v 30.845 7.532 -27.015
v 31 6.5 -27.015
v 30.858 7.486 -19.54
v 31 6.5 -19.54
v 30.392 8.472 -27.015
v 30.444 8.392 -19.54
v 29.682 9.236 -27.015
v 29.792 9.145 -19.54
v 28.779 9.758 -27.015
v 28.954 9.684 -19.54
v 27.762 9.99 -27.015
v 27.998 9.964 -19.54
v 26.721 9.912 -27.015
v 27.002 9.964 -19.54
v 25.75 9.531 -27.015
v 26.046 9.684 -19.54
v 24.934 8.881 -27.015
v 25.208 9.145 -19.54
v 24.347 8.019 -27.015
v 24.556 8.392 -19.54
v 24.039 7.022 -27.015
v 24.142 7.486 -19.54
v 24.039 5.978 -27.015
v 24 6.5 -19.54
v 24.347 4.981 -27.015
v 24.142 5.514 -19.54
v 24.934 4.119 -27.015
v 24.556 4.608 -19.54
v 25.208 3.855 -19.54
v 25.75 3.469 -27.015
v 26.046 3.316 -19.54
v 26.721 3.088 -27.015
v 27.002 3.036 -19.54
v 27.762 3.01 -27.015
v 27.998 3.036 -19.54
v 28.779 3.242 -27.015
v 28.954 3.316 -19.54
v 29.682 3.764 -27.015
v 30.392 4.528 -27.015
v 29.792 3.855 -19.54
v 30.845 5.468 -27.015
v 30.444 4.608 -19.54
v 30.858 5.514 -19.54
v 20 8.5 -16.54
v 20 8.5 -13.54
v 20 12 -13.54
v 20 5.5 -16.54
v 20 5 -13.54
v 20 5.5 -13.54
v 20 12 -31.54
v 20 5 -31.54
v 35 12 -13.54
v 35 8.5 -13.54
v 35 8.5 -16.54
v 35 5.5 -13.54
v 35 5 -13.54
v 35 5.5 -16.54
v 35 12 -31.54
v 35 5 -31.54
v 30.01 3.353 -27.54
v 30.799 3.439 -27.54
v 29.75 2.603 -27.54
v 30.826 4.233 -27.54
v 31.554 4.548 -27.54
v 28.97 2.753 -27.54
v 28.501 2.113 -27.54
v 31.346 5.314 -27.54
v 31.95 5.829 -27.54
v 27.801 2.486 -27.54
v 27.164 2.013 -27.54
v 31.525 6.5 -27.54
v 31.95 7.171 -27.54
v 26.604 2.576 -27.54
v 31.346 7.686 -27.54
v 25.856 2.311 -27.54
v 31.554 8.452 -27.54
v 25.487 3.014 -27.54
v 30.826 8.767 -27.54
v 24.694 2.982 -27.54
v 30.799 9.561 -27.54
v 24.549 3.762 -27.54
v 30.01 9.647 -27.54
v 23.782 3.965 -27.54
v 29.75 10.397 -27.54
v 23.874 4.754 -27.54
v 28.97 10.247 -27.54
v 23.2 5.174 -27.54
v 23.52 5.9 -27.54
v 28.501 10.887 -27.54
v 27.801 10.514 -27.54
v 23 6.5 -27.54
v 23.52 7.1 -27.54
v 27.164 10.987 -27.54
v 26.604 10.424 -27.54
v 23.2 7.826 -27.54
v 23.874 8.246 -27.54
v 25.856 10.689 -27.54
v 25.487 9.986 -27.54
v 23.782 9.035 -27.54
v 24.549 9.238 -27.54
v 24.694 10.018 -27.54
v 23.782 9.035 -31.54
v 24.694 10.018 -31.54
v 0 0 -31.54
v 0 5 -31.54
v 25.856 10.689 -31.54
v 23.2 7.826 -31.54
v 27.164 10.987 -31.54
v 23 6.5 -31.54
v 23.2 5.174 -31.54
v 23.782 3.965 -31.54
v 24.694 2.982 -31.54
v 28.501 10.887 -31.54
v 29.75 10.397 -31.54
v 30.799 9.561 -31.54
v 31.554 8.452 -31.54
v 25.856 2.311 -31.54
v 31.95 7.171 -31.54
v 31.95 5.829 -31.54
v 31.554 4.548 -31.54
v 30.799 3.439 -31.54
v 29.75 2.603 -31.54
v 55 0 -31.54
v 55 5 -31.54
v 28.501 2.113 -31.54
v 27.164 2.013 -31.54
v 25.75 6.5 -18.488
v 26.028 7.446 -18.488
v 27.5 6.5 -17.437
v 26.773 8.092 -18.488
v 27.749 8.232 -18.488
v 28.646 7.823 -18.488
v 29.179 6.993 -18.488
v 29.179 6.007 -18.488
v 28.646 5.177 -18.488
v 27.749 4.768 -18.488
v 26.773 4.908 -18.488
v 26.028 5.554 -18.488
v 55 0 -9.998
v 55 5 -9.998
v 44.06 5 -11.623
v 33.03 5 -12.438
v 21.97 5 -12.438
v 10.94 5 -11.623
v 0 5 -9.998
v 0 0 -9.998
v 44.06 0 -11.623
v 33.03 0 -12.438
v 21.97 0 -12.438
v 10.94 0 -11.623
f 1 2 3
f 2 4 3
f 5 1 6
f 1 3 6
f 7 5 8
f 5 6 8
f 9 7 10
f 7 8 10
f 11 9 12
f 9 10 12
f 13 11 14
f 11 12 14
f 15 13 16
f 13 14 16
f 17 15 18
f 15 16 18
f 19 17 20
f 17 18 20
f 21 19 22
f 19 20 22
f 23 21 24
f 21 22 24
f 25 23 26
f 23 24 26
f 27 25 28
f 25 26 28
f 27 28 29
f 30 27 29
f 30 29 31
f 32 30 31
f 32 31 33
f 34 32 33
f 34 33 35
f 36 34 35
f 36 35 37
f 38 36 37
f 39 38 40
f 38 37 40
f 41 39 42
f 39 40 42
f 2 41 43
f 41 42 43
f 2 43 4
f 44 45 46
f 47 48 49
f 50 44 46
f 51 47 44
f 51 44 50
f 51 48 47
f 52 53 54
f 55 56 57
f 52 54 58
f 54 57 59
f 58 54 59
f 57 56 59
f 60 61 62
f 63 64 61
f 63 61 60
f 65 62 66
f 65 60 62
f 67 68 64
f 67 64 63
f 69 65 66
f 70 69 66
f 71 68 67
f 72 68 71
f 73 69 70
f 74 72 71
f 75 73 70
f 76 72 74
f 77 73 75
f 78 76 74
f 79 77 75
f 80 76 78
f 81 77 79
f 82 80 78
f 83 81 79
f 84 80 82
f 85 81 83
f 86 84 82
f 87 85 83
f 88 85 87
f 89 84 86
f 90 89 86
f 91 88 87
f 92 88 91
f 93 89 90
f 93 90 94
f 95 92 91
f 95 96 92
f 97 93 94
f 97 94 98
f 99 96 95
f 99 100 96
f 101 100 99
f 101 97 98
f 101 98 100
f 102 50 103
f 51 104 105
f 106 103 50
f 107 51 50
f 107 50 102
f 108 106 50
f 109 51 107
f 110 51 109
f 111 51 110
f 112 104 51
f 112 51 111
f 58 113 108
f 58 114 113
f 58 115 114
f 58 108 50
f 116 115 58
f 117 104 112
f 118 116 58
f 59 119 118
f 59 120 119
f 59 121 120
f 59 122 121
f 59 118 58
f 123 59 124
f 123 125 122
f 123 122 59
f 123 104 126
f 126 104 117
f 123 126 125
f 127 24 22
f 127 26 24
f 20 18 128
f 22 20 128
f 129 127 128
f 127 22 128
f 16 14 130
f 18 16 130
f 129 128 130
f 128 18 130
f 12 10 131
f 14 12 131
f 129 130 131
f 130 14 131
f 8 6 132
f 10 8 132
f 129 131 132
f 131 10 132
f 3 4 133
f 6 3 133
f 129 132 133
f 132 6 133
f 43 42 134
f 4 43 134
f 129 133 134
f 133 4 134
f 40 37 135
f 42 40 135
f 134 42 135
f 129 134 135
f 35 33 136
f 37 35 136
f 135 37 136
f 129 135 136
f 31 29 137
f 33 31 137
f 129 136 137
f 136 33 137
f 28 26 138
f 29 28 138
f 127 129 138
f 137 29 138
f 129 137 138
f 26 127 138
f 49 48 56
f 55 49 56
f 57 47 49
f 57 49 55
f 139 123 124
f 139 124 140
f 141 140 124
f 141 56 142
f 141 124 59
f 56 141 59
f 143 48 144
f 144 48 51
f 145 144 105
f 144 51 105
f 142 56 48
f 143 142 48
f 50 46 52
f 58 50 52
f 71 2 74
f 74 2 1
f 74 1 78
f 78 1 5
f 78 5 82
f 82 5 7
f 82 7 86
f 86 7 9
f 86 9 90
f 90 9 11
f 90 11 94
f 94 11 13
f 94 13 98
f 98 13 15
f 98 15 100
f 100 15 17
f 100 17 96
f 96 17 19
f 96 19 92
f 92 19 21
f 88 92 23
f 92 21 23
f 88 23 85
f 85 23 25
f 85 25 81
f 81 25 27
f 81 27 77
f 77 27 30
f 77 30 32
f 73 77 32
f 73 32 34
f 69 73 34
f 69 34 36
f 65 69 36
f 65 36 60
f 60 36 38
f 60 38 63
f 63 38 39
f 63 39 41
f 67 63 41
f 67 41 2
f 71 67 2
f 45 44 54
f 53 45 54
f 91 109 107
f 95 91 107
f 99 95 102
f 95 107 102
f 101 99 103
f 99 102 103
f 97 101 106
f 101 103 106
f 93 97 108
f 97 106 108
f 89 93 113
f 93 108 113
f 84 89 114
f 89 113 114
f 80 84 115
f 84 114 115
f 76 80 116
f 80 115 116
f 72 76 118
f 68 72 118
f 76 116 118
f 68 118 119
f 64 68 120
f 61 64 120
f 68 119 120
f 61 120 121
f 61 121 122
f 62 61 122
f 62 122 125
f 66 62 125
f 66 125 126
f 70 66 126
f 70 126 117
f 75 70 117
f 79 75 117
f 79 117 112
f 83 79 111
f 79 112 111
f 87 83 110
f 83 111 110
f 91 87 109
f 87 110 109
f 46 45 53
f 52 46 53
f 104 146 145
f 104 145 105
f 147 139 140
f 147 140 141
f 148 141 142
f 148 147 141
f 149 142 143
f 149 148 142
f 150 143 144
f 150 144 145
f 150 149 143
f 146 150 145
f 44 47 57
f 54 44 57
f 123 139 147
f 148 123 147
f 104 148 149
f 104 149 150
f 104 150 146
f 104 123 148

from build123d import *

# Parameters (mm, degrees)
BOSS_EXTRUDE1_DEPTH             = 5
SKETCH4_W                       = 15
SKETCH4_H                       = 18
BOSS_EXTRUDE2_DEPTH             = 0.5
SKETCH5_W                       = 15
SKETCH5_H                       = 15
BOSS_EXTRUDE3_DEPTH             = 3
SKETCH6_W                       = 15
SKETCH6_H                       = 18
BOSS_EXTRUDE4_DEPTH             = 3.5
SKETCH9_R                       = 4.5
CUT_EXTRUDE1_DEPTH              = 4
M8X1_0_TAPPED_HOLE1_D           = 7
M8X1_0_TAPPED_HOLE1_DEPTH       = 8
M8X1_0_TAPPED_HOLE1_CSINK_D     = 8.05
M8X1_0_TAPPED_HOLE1_CSINK_ANGLE = 90
M8X1_0_TAPPED_HOLE1_TIP         = 2.103012167


with BuildPart() as part:
    # Sketch1 → Boss-Extrude1 (new body)
    with BuildSketch(Plane(origin=(0, 0, 0), x_dir=(1, 0, 0), z_dir=(0, 1, 0))):
        with BuildLine():
            Line((0, 9.997621031), (0, 31.54))
            Line((0, 31.54), (55, 31.54))
            Line((55, 31.54), (55, 9.997621031))
            ThreePointArc((55, 9.997621031), (27.5, 12.54), (0, 9.997621031))
        make_face()
    extrude(amount=BOSS_EXTRUDE1_DEPTH)

    # Sketch4 → Boss-Extrude2 (add)
    with BuildSketch(Plane(origin=(0, 5, 0), x_dir=(1, 0, 0), z_dir=(0, 1, 0))):
        with Locations((27.5, 22.54)):
            Rectangle(SKETCH4_W, SKETCH4_H)
    extrude(amount=BOSS_EXTRUDE2_DEPTH)

    # Sketch5 → Boss-Extrude3 (add)
    with BuildSketch(Plane(origin=(0, 5.5, 0), x_dir=(1, 0, 0), z_dir=(0, 1, 0))):
        with Locations((27.5, 24.04)):
            Rectangle(SKETCH5_W, SKETCH5_H)
    extrude(amount=BOSS_EXTRUDE3_DEPTH)

    # Sketch6 → Boss-Extrude4 (add)
    with BuildSketch(Plane(origin=(0, 8.5, 0), x_dir=(1, 0, 0), z_dir=(0, 1, 0))):
        with Locations((27.5, 22.54)):
            Rectangle(SKETCH6_W, SKETCH6_H)
    extrude(amount=BOSS_EXTRUDE4_DEPTH)

    # Sketch9 → Cut-Extrude1 (cut)
    with BuildSketch(Plane(origin=(0, 0, -31.54), x_dir=(-1, 0, 0), z_dir=(0, 0, -1))):
        with Locations((-27.5, 6.5)):
            Circle(SKETCH9_R)
    extrude(amount=-CUT_EXTRUDE1_DEPTH, mode=Mode.SUBTRACT)

    # M8x1.0 Tapped Hole1
    with Locations(Plane(origin=(0, 0, -27.54), x_dir=(-1, 0, 0), z_dir=(0, 0, -1))):
        with Locations((-27.5, 6.5)):
            CounterSinkHole(M8X1_0_TAPPED_HOLE1_D / 2, M8X1_0_TAPPED_HOLE1_CSINK_D / 2, depth=M8X1_0_TAPPED_HOLE1_DEPTH, counter_sink_angle=M8X1_0_TAPPED_HOLE1_CSINK_ANGLE)
            with Locations((0, 0, -(M8X1_0_TAPPED_HOLE1_DEPTH + M8X1_0_TAPPED_HOLE1_TIP / 2))):  # 118° drill point
                Cone(0, M8X1_0_TAPPED_HOLE1_D / 2, M8X1_0_TAPPED_HOLE1_TIP, mode=Mode.SUBTRACT)


solid = part.part
